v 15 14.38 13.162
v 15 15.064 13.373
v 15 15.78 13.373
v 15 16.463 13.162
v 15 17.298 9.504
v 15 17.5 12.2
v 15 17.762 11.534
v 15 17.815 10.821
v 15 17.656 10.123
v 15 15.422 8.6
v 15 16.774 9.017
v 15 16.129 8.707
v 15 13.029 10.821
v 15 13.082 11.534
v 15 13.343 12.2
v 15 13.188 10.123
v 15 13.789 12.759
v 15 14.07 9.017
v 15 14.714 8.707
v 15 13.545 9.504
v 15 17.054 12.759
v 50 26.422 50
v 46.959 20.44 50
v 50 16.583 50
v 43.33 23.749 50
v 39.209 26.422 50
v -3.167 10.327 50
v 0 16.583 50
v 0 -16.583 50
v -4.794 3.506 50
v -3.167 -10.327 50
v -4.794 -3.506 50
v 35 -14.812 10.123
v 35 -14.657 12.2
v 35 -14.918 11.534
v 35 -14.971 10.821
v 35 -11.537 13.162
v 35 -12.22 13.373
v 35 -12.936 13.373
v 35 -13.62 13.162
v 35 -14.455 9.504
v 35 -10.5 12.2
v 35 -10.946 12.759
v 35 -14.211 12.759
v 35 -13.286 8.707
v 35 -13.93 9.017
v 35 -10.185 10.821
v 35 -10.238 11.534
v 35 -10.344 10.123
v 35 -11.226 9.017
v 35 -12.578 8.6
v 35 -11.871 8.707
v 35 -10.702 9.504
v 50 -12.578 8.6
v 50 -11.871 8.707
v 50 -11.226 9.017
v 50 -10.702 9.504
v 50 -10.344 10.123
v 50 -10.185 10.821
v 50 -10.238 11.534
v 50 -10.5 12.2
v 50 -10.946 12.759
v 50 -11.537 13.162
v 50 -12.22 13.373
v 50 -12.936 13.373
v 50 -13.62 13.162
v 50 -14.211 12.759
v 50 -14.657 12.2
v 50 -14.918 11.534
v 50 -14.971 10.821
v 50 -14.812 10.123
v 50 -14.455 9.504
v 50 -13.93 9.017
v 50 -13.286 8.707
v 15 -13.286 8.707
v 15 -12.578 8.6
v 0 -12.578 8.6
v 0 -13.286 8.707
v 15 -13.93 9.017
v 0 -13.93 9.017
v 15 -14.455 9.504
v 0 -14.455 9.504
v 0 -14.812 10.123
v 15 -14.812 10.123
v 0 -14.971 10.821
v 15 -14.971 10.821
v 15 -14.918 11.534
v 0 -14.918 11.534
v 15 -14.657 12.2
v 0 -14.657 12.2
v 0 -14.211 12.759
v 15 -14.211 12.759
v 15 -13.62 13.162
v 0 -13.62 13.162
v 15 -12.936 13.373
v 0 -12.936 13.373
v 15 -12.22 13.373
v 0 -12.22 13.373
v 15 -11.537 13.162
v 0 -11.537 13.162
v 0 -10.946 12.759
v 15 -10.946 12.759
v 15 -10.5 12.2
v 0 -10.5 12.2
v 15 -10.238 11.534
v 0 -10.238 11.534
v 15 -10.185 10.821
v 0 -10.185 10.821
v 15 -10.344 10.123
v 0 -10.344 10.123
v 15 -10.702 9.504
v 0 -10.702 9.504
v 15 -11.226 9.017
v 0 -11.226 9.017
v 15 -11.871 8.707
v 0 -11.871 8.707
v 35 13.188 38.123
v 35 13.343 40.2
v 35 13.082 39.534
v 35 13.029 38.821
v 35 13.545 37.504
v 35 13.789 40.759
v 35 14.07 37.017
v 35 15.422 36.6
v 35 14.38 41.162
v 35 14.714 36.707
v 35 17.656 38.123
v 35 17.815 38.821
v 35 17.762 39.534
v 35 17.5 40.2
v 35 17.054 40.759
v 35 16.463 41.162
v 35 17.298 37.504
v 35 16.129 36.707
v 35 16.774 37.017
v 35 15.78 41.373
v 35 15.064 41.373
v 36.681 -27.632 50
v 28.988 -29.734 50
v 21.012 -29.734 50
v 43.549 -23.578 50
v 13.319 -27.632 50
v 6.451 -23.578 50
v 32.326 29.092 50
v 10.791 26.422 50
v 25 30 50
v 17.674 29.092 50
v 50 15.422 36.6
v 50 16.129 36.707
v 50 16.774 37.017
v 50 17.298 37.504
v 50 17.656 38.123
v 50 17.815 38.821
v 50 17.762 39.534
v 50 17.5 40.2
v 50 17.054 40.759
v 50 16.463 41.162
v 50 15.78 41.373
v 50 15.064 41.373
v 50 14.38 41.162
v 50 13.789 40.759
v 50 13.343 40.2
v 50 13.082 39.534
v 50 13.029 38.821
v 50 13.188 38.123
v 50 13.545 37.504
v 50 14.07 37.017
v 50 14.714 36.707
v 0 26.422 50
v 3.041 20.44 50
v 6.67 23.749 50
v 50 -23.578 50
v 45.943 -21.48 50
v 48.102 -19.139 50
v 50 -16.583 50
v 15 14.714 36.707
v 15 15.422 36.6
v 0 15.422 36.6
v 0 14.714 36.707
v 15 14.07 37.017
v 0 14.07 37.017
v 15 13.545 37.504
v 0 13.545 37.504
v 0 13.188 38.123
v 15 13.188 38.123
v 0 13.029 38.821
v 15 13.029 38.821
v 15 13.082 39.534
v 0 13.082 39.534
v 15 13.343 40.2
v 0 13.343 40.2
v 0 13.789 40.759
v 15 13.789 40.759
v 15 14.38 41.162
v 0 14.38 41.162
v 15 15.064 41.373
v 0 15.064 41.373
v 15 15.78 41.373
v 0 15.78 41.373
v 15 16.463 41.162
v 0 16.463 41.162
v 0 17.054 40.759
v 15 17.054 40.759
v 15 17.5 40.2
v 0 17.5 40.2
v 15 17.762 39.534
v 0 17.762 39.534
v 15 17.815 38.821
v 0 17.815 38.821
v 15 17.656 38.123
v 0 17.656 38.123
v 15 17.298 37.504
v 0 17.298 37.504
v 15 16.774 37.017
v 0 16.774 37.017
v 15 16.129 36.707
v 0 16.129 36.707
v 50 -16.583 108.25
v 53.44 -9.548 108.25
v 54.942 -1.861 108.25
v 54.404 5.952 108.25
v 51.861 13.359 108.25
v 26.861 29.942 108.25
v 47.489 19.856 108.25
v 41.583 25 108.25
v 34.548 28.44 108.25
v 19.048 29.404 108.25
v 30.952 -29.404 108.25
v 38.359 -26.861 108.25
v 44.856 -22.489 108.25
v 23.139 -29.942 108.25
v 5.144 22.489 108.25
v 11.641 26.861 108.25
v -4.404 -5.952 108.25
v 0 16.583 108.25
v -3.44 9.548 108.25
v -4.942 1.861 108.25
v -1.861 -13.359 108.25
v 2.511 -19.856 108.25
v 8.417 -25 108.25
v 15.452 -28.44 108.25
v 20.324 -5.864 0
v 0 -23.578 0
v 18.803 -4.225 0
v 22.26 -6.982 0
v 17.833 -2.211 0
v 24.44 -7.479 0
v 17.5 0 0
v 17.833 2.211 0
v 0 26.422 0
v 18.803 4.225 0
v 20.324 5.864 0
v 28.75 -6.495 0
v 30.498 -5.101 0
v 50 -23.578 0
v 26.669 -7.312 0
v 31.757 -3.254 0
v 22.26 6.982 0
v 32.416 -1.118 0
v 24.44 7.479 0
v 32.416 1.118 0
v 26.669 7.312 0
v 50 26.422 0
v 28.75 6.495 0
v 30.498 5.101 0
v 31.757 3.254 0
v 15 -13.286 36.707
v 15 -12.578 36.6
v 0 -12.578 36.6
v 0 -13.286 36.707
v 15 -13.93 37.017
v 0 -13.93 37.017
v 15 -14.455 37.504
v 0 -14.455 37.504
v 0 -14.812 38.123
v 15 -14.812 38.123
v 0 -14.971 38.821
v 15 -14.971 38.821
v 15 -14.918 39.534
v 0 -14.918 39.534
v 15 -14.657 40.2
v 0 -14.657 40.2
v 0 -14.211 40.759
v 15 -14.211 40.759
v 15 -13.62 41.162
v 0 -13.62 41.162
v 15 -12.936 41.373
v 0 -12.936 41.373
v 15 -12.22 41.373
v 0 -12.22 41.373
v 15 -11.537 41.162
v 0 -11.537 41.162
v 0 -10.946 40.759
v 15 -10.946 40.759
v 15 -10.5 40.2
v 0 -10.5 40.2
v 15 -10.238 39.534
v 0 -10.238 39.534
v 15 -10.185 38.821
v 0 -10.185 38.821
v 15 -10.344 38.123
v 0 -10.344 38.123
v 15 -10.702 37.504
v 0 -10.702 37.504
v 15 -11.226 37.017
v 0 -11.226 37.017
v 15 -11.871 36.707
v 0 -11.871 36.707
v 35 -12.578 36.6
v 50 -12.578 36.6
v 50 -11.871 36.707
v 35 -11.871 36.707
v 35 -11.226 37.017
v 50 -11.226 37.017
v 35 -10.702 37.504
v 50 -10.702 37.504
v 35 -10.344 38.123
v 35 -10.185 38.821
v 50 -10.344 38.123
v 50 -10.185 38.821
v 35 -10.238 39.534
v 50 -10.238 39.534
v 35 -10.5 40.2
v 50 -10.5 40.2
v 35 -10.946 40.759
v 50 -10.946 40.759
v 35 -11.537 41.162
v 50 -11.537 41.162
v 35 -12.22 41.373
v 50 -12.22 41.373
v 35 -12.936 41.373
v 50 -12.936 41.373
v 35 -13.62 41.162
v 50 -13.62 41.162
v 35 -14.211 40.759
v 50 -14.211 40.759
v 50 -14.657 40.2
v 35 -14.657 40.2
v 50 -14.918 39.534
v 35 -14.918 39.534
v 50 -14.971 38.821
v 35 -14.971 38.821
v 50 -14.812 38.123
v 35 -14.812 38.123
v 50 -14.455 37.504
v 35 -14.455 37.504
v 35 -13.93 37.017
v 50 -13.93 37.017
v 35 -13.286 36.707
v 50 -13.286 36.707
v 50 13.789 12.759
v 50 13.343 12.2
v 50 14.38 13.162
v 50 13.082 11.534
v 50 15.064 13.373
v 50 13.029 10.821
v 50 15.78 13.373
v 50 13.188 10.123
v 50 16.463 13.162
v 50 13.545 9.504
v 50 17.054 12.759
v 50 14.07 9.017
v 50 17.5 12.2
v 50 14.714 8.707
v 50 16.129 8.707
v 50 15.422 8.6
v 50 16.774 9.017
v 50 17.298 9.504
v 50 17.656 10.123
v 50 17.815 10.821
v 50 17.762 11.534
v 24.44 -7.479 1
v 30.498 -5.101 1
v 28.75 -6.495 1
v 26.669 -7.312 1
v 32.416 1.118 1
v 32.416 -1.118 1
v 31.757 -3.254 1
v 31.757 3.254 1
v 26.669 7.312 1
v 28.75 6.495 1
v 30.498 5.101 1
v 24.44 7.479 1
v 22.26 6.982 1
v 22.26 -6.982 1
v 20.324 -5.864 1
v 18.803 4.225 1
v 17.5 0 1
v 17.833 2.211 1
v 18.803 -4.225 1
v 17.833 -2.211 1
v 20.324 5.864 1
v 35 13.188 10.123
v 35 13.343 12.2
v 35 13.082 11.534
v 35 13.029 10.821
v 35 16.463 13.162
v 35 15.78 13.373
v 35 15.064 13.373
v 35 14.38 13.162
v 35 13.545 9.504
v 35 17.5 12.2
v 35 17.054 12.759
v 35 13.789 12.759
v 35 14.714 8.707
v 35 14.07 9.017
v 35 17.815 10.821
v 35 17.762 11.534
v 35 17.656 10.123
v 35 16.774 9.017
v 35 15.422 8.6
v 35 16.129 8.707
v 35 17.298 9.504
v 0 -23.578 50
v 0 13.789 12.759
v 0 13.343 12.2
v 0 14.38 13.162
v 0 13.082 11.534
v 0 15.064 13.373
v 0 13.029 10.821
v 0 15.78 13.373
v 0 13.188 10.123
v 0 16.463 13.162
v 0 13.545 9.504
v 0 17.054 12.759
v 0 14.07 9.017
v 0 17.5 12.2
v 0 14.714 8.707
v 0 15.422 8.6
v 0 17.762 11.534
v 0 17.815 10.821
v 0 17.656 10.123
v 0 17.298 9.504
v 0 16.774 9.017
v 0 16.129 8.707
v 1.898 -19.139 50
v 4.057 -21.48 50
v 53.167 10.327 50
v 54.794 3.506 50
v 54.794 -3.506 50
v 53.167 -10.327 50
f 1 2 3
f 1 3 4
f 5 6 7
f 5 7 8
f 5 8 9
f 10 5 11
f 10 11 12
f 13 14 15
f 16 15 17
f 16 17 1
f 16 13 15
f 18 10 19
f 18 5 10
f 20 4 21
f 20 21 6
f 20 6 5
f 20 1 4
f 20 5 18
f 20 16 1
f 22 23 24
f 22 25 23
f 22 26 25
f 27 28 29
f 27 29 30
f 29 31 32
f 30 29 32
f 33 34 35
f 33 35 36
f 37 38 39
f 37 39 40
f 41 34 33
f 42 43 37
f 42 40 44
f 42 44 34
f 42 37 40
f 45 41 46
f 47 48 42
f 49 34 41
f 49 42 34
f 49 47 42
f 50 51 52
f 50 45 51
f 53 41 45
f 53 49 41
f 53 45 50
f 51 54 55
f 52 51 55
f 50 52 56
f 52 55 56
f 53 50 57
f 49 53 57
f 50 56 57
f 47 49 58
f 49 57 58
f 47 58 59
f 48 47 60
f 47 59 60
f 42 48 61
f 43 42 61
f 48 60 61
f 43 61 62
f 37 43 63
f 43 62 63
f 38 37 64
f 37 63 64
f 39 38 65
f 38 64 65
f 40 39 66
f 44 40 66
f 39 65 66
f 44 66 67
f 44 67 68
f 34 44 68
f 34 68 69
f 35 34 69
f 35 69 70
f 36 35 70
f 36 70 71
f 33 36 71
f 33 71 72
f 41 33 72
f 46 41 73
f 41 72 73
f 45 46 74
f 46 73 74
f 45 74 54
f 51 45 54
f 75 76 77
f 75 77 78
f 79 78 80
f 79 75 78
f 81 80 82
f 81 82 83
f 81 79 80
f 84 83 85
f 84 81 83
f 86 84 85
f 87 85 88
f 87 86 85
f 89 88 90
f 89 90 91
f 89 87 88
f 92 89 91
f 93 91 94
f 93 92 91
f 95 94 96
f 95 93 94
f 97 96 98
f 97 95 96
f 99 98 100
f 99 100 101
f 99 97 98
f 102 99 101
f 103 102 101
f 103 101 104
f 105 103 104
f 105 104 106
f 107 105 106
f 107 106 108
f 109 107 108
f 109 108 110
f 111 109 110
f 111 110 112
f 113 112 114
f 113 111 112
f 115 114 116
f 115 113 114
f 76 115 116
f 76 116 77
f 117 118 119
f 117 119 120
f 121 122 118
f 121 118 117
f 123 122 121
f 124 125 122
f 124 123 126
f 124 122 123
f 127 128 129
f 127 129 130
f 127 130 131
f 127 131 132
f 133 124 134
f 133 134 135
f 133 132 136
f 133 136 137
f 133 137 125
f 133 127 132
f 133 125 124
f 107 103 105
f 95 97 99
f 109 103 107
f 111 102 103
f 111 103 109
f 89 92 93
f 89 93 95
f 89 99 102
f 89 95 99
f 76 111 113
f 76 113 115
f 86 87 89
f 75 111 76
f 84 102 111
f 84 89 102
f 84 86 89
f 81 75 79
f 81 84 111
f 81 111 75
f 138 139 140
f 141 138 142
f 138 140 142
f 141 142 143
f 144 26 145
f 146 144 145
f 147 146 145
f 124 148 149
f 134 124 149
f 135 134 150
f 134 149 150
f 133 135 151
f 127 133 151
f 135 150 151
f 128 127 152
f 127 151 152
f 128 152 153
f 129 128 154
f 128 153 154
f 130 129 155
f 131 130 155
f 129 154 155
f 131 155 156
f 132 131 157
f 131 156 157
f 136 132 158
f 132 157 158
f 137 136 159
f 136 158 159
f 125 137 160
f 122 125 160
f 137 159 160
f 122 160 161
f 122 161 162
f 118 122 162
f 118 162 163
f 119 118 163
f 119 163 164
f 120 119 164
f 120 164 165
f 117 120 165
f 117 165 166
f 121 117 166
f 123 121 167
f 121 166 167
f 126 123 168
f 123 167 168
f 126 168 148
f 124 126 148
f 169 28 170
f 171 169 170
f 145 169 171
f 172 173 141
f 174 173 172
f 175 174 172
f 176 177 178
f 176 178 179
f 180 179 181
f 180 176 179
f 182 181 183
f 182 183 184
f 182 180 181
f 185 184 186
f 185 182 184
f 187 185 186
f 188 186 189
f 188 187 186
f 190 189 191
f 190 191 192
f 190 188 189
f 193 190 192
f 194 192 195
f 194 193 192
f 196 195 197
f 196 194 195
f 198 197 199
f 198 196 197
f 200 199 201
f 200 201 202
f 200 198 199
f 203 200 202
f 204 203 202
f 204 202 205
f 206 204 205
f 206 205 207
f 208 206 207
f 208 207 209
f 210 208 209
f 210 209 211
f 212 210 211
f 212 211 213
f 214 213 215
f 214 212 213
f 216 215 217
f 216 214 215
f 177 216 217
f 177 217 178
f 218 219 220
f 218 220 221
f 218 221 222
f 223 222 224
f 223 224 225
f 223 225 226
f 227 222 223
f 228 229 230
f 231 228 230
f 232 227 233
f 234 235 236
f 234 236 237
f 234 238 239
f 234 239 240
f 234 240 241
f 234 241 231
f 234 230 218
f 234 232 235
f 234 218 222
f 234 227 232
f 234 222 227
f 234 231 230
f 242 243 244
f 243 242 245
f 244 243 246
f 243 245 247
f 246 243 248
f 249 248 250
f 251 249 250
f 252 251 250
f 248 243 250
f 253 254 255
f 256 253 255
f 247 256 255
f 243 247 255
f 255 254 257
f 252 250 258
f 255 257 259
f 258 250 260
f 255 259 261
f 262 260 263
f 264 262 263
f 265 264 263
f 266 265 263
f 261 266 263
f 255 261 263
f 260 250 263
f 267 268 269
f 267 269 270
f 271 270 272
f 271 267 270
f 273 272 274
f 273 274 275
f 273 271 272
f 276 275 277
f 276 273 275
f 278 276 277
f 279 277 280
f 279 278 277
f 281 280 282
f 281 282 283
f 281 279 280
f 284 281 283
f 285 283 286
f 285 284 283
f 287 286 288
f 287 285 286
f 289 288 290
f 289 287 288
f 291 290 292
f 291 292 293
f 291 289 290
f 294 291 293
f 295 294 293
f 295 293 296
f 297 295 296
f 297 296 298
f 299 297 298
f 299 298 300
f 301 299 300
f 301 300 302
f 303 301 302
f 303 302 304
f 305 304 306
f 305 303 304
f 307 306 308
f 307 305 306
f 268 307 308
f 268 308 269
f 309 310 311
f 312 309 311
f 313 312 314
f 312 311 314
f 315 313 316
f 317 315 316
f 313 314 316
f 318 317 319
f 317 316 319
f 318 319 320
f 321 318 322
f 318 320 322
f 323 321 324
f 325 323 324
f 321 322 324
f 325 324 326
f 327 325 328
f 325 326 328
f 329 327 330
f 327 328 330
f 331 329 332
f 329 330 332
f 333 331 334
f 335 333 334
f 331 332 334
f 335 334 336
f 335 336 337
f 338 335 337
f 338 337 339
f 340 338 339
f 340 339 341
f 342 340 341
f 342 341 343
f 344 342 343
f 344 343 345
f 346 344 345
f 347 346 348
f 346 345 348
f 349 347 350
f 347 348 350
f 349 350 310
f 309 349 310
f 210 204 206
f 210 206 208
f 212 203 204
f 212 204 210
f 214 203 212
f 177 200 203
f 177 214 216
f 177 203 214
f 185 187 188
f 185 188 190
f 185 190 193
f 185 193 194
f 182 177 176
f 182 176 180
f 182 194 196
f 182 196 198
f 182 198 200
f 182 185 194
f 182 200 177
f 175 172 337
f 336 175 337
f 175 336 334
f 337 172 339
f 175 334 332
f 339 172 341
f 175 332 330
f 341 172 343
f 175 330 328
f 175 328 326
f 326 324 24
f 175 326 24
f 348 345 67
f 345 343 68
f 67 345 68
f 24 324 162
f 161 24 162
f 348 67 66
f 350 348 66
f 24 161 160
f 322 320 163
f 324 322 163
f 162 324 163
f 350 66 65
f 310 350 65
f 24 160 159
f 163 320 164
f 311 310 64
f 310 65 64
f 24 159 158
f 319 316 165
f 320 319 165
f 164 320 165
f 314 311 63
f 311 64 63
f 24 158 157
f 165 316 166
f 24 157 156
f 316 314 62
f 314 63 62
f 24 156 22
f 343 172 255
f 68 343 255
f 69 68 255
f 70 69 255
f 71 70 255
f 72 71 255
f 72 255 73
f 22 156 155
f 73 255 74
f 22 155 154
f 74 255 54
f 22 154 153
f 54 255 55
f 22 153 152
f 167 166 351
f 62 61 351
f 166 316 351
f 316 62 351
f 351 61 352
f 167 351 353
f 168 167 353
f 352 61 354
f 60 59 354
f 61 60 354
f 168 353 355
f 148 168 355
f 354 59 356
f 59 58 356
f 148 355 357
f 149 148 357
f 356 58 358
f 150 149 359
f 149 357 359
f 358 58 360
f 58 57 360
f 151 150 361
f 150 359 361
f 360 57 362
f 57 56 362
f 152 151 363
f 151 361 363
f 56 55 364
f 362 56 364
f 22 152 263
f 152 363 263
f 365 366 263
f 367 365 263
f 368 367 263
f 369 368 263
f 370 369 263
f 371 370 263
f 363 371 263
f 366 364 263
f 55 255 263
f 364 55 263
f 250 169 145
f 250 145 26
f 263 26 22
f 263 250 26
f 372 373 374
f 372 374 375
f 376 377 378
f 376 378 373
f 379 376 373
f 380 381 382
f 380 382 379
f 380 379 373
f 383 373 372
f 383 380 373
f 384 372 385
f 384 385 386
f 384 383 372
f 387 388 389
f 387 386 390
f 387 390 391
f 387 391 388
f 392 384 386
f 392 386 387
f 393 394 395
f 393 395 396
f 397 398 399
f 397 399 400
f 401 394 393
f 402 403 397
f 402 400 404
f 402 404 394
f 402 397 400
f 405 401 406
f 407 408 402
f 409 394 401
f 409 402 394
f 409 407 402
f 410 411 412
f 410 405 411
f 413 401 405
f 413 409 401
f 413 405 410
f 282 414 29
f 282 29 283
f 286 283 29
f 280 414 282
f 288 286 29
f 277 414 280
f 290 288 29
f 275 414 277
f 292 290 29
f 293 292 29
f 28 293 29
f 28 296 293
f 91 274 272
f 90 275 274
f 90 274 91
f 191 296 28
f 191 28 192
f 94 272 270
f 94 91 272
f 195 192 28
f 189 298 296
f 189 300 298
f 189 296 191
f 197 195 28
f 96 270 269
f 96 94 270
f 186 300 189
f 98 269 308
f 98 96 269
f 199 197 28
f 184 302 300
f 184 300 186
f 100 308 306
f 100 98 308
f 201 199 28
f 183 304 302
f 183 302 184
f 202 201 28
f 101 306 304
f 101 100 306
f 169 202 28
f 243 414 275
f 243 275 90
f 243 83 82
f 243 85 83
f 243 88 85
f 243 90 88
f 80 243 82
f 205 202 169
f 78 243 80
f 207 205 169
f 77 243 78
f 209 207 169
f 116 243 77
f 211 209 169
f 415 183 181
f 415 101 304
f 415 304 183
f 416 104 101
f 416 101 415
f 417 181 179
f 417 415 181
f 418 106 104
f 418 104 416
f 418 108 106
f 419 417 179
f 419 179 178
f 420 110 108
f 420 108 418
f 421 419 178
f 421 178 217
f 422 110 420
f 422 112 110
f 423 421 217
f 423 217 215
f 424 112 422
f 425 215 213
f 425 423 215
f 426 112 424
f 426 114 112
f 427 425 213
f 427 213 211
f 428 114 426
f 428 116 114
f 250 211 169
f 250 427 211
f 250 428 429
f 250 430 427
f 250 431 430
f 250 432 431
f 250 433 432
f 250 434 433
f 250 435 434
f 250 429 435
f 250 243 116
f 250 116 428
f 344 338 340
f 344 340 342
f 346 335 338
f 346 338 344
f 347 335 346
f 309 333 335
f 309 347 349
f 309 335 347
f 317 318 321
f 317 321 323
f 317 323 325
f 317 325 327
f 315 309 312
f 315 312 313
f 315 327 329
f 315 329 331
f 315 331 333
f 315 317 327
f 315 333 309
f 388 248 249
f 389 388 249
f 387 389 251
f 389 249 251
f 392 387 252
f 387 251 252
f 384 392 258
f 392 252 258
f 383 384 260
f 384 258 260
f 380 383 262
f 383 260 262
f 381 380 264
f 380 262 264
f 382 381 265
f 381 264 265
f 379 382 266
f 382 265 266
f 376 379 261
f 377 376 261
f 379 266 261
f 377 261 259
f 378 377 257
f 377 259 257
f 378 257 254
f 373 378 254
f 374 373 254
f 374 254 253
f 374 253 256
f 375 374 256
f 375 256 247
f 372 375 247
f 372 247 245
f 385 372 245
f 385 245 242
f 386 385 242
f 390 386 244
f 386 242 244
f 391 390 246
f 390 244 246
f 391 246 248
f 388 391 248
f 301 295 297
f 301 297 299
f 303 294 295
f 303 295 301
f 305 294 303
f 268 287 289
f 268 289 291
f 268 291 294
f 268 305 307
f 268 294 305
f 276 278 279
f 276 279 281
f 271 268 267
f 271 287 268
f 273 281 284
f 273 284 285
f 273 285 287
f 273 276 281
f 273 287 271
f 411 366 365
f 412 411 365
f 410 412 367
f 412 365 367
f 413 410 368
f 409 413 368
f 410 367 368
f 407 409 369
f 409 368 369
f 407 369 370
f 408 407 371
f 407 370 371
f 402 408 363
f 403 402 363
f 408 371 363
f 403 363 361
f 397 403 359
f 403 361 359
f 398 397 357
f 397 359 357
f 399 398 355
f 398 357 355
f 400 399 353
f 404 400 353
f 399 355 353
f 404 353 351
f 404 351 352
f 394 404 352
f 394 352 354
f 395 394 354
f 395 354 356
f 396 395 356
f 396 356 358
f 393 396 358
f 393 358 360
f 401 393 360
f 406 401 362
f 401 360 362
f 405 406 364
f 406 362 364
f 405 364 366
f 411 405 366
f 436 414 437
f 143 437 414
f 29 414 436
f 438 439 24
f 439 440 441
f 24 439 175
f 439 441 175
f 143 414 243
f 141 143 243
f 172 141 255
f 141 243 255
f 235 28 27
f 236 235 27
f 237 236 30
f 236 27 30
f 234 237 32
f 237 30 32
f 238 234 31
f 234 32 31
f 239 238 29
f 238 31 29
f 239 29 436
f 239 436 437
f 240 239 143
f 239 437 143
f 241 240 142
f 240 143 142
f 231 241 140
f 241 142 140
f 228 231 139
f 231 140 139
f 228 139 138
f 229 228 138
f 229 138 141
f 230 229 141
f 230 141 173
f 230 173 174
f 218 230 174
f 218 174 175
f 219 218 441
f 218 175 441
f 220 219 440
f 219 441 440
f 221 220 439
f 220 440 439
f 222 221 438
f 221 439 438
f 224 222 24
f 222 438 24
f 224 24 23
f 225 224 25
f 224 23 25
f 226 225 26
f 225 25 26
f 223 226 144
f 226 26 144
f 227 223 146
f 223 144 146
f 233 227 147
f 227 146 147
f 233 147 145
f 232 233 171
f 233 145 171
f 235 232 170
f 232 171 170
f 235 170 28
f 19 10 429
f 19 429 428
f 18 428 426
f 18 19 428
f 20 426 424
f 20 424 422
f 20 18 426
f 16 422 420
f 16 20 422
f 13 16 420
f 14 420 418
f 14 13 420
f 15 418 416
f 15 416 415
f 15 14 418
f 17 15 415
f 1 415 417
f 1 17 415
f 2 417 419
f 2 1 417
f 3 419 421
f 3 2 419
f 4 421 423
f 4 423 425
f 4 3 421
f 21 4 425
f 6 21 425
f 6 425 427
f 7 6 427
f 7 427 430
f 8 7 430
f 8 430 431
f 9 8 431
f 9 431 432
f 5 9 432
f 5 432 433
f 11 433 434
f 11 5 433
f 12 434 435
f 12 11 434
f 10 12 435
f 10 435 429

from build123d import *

# Parameters (mm, degrees)
SKETCH1_W           = 50
SKETCH1_H           = 50
BOSS_EXTRUDE1_DEPTH = 50
SKETCH2_R           = 30
BOSS_EXTRUDE2_DEPTH = 58.25
SKETCH3_R           = 7.5
CUT_EXTRUDE1_DEPTH  = 1
SKETCH4_R           = 2.4
CUT_EXTRUDE2_DEPTH  = 15
CUT_EXTRUDE3_START  = -15
SKETCH5_R           = 2.4
CUT_EXTRUDE3_DEPTH  = 15


with BuildPart() as part:
    # Sketch1 → Boss-Extrude1 (new body)
    with BuildSketch(Plane.XY):
        with Locations((25, 1.421800948)):
            Rectangle(SKETCH1_W, SKETCH1_H)
    extrude(amount=BOSS_EXTRUDE1_DEPTH)

    # Sketch2 → Boss-Extrude2 (add)
    with BuildSketch(Plane.XY.offset(50)):
        with Locations(Location((25, 0, 0), (0, 0, 146.442690238))):
            Circle(SKETCH2_R)
    extrude(amount=BOSS_EXTRUDE2_DEPTH)

    # Sketch3 → Cut-Extrude1 (cut)
    with BuildSketch(Plane(origin=(0, 0, 0), x_dir=(-1, 0, 0), z_dir=(0, 0, -1))):
        with Locations((-25, 0)):
            Circle(SKETCH3_R)
    extrude(amount=-CUT_EXTRUDE1_DEPTH, mode=Mode.SUBTRACT)

    # Sketch4 → Cut-Extrude2 (cut)
    with BuildSketch(Plane(origin=(50, 0, 0), x_dir=(0, 0, -1), z_dir=(1, 0, 0))):
        with Locations((-39, 15.421800948)):
            Circle(SKETCH4_R)
        with Locations((-11, 15.421800948)):
            Circle(SKETCH4_R)
        with Locations((-11, -12.578199052)):
            Circle(SKETCH4_R)
        with Locations((-39, -12.578199052)):
            Circle(SKETCH4_R)
    extrude(amount=-CUT_EXTRUDE2_DEPTH, mode=Mode.SUBTRACT)

    # Sketch5 → Cut-Extrude3 (cut)
    with BuildSketch(Plane.ZY.offset(CUT_EXTRUDE3_START)):
        with Locations(Location((11, 15.421800948, 0), (0, 0, 180))):
            Circle(SKETCH5_R)
        with Locations(Location((39, 15.421800948, 0), (0, 0, 180))):
            Circle(SKETCH5_R)
        with Locations(Location((39, -12.578199052, 0), (0, 0, 180))):
            Circle(SKETCH5_R)
        with Locations(Location((11, -12.578199052, 0), (0, 0, 180))):
            Circle(SKETCH5_R)
    extrude(amount=CUT_EXTRUDE3_DEPTH, mode=Mode.SUBTRACT)


solid = part.part
